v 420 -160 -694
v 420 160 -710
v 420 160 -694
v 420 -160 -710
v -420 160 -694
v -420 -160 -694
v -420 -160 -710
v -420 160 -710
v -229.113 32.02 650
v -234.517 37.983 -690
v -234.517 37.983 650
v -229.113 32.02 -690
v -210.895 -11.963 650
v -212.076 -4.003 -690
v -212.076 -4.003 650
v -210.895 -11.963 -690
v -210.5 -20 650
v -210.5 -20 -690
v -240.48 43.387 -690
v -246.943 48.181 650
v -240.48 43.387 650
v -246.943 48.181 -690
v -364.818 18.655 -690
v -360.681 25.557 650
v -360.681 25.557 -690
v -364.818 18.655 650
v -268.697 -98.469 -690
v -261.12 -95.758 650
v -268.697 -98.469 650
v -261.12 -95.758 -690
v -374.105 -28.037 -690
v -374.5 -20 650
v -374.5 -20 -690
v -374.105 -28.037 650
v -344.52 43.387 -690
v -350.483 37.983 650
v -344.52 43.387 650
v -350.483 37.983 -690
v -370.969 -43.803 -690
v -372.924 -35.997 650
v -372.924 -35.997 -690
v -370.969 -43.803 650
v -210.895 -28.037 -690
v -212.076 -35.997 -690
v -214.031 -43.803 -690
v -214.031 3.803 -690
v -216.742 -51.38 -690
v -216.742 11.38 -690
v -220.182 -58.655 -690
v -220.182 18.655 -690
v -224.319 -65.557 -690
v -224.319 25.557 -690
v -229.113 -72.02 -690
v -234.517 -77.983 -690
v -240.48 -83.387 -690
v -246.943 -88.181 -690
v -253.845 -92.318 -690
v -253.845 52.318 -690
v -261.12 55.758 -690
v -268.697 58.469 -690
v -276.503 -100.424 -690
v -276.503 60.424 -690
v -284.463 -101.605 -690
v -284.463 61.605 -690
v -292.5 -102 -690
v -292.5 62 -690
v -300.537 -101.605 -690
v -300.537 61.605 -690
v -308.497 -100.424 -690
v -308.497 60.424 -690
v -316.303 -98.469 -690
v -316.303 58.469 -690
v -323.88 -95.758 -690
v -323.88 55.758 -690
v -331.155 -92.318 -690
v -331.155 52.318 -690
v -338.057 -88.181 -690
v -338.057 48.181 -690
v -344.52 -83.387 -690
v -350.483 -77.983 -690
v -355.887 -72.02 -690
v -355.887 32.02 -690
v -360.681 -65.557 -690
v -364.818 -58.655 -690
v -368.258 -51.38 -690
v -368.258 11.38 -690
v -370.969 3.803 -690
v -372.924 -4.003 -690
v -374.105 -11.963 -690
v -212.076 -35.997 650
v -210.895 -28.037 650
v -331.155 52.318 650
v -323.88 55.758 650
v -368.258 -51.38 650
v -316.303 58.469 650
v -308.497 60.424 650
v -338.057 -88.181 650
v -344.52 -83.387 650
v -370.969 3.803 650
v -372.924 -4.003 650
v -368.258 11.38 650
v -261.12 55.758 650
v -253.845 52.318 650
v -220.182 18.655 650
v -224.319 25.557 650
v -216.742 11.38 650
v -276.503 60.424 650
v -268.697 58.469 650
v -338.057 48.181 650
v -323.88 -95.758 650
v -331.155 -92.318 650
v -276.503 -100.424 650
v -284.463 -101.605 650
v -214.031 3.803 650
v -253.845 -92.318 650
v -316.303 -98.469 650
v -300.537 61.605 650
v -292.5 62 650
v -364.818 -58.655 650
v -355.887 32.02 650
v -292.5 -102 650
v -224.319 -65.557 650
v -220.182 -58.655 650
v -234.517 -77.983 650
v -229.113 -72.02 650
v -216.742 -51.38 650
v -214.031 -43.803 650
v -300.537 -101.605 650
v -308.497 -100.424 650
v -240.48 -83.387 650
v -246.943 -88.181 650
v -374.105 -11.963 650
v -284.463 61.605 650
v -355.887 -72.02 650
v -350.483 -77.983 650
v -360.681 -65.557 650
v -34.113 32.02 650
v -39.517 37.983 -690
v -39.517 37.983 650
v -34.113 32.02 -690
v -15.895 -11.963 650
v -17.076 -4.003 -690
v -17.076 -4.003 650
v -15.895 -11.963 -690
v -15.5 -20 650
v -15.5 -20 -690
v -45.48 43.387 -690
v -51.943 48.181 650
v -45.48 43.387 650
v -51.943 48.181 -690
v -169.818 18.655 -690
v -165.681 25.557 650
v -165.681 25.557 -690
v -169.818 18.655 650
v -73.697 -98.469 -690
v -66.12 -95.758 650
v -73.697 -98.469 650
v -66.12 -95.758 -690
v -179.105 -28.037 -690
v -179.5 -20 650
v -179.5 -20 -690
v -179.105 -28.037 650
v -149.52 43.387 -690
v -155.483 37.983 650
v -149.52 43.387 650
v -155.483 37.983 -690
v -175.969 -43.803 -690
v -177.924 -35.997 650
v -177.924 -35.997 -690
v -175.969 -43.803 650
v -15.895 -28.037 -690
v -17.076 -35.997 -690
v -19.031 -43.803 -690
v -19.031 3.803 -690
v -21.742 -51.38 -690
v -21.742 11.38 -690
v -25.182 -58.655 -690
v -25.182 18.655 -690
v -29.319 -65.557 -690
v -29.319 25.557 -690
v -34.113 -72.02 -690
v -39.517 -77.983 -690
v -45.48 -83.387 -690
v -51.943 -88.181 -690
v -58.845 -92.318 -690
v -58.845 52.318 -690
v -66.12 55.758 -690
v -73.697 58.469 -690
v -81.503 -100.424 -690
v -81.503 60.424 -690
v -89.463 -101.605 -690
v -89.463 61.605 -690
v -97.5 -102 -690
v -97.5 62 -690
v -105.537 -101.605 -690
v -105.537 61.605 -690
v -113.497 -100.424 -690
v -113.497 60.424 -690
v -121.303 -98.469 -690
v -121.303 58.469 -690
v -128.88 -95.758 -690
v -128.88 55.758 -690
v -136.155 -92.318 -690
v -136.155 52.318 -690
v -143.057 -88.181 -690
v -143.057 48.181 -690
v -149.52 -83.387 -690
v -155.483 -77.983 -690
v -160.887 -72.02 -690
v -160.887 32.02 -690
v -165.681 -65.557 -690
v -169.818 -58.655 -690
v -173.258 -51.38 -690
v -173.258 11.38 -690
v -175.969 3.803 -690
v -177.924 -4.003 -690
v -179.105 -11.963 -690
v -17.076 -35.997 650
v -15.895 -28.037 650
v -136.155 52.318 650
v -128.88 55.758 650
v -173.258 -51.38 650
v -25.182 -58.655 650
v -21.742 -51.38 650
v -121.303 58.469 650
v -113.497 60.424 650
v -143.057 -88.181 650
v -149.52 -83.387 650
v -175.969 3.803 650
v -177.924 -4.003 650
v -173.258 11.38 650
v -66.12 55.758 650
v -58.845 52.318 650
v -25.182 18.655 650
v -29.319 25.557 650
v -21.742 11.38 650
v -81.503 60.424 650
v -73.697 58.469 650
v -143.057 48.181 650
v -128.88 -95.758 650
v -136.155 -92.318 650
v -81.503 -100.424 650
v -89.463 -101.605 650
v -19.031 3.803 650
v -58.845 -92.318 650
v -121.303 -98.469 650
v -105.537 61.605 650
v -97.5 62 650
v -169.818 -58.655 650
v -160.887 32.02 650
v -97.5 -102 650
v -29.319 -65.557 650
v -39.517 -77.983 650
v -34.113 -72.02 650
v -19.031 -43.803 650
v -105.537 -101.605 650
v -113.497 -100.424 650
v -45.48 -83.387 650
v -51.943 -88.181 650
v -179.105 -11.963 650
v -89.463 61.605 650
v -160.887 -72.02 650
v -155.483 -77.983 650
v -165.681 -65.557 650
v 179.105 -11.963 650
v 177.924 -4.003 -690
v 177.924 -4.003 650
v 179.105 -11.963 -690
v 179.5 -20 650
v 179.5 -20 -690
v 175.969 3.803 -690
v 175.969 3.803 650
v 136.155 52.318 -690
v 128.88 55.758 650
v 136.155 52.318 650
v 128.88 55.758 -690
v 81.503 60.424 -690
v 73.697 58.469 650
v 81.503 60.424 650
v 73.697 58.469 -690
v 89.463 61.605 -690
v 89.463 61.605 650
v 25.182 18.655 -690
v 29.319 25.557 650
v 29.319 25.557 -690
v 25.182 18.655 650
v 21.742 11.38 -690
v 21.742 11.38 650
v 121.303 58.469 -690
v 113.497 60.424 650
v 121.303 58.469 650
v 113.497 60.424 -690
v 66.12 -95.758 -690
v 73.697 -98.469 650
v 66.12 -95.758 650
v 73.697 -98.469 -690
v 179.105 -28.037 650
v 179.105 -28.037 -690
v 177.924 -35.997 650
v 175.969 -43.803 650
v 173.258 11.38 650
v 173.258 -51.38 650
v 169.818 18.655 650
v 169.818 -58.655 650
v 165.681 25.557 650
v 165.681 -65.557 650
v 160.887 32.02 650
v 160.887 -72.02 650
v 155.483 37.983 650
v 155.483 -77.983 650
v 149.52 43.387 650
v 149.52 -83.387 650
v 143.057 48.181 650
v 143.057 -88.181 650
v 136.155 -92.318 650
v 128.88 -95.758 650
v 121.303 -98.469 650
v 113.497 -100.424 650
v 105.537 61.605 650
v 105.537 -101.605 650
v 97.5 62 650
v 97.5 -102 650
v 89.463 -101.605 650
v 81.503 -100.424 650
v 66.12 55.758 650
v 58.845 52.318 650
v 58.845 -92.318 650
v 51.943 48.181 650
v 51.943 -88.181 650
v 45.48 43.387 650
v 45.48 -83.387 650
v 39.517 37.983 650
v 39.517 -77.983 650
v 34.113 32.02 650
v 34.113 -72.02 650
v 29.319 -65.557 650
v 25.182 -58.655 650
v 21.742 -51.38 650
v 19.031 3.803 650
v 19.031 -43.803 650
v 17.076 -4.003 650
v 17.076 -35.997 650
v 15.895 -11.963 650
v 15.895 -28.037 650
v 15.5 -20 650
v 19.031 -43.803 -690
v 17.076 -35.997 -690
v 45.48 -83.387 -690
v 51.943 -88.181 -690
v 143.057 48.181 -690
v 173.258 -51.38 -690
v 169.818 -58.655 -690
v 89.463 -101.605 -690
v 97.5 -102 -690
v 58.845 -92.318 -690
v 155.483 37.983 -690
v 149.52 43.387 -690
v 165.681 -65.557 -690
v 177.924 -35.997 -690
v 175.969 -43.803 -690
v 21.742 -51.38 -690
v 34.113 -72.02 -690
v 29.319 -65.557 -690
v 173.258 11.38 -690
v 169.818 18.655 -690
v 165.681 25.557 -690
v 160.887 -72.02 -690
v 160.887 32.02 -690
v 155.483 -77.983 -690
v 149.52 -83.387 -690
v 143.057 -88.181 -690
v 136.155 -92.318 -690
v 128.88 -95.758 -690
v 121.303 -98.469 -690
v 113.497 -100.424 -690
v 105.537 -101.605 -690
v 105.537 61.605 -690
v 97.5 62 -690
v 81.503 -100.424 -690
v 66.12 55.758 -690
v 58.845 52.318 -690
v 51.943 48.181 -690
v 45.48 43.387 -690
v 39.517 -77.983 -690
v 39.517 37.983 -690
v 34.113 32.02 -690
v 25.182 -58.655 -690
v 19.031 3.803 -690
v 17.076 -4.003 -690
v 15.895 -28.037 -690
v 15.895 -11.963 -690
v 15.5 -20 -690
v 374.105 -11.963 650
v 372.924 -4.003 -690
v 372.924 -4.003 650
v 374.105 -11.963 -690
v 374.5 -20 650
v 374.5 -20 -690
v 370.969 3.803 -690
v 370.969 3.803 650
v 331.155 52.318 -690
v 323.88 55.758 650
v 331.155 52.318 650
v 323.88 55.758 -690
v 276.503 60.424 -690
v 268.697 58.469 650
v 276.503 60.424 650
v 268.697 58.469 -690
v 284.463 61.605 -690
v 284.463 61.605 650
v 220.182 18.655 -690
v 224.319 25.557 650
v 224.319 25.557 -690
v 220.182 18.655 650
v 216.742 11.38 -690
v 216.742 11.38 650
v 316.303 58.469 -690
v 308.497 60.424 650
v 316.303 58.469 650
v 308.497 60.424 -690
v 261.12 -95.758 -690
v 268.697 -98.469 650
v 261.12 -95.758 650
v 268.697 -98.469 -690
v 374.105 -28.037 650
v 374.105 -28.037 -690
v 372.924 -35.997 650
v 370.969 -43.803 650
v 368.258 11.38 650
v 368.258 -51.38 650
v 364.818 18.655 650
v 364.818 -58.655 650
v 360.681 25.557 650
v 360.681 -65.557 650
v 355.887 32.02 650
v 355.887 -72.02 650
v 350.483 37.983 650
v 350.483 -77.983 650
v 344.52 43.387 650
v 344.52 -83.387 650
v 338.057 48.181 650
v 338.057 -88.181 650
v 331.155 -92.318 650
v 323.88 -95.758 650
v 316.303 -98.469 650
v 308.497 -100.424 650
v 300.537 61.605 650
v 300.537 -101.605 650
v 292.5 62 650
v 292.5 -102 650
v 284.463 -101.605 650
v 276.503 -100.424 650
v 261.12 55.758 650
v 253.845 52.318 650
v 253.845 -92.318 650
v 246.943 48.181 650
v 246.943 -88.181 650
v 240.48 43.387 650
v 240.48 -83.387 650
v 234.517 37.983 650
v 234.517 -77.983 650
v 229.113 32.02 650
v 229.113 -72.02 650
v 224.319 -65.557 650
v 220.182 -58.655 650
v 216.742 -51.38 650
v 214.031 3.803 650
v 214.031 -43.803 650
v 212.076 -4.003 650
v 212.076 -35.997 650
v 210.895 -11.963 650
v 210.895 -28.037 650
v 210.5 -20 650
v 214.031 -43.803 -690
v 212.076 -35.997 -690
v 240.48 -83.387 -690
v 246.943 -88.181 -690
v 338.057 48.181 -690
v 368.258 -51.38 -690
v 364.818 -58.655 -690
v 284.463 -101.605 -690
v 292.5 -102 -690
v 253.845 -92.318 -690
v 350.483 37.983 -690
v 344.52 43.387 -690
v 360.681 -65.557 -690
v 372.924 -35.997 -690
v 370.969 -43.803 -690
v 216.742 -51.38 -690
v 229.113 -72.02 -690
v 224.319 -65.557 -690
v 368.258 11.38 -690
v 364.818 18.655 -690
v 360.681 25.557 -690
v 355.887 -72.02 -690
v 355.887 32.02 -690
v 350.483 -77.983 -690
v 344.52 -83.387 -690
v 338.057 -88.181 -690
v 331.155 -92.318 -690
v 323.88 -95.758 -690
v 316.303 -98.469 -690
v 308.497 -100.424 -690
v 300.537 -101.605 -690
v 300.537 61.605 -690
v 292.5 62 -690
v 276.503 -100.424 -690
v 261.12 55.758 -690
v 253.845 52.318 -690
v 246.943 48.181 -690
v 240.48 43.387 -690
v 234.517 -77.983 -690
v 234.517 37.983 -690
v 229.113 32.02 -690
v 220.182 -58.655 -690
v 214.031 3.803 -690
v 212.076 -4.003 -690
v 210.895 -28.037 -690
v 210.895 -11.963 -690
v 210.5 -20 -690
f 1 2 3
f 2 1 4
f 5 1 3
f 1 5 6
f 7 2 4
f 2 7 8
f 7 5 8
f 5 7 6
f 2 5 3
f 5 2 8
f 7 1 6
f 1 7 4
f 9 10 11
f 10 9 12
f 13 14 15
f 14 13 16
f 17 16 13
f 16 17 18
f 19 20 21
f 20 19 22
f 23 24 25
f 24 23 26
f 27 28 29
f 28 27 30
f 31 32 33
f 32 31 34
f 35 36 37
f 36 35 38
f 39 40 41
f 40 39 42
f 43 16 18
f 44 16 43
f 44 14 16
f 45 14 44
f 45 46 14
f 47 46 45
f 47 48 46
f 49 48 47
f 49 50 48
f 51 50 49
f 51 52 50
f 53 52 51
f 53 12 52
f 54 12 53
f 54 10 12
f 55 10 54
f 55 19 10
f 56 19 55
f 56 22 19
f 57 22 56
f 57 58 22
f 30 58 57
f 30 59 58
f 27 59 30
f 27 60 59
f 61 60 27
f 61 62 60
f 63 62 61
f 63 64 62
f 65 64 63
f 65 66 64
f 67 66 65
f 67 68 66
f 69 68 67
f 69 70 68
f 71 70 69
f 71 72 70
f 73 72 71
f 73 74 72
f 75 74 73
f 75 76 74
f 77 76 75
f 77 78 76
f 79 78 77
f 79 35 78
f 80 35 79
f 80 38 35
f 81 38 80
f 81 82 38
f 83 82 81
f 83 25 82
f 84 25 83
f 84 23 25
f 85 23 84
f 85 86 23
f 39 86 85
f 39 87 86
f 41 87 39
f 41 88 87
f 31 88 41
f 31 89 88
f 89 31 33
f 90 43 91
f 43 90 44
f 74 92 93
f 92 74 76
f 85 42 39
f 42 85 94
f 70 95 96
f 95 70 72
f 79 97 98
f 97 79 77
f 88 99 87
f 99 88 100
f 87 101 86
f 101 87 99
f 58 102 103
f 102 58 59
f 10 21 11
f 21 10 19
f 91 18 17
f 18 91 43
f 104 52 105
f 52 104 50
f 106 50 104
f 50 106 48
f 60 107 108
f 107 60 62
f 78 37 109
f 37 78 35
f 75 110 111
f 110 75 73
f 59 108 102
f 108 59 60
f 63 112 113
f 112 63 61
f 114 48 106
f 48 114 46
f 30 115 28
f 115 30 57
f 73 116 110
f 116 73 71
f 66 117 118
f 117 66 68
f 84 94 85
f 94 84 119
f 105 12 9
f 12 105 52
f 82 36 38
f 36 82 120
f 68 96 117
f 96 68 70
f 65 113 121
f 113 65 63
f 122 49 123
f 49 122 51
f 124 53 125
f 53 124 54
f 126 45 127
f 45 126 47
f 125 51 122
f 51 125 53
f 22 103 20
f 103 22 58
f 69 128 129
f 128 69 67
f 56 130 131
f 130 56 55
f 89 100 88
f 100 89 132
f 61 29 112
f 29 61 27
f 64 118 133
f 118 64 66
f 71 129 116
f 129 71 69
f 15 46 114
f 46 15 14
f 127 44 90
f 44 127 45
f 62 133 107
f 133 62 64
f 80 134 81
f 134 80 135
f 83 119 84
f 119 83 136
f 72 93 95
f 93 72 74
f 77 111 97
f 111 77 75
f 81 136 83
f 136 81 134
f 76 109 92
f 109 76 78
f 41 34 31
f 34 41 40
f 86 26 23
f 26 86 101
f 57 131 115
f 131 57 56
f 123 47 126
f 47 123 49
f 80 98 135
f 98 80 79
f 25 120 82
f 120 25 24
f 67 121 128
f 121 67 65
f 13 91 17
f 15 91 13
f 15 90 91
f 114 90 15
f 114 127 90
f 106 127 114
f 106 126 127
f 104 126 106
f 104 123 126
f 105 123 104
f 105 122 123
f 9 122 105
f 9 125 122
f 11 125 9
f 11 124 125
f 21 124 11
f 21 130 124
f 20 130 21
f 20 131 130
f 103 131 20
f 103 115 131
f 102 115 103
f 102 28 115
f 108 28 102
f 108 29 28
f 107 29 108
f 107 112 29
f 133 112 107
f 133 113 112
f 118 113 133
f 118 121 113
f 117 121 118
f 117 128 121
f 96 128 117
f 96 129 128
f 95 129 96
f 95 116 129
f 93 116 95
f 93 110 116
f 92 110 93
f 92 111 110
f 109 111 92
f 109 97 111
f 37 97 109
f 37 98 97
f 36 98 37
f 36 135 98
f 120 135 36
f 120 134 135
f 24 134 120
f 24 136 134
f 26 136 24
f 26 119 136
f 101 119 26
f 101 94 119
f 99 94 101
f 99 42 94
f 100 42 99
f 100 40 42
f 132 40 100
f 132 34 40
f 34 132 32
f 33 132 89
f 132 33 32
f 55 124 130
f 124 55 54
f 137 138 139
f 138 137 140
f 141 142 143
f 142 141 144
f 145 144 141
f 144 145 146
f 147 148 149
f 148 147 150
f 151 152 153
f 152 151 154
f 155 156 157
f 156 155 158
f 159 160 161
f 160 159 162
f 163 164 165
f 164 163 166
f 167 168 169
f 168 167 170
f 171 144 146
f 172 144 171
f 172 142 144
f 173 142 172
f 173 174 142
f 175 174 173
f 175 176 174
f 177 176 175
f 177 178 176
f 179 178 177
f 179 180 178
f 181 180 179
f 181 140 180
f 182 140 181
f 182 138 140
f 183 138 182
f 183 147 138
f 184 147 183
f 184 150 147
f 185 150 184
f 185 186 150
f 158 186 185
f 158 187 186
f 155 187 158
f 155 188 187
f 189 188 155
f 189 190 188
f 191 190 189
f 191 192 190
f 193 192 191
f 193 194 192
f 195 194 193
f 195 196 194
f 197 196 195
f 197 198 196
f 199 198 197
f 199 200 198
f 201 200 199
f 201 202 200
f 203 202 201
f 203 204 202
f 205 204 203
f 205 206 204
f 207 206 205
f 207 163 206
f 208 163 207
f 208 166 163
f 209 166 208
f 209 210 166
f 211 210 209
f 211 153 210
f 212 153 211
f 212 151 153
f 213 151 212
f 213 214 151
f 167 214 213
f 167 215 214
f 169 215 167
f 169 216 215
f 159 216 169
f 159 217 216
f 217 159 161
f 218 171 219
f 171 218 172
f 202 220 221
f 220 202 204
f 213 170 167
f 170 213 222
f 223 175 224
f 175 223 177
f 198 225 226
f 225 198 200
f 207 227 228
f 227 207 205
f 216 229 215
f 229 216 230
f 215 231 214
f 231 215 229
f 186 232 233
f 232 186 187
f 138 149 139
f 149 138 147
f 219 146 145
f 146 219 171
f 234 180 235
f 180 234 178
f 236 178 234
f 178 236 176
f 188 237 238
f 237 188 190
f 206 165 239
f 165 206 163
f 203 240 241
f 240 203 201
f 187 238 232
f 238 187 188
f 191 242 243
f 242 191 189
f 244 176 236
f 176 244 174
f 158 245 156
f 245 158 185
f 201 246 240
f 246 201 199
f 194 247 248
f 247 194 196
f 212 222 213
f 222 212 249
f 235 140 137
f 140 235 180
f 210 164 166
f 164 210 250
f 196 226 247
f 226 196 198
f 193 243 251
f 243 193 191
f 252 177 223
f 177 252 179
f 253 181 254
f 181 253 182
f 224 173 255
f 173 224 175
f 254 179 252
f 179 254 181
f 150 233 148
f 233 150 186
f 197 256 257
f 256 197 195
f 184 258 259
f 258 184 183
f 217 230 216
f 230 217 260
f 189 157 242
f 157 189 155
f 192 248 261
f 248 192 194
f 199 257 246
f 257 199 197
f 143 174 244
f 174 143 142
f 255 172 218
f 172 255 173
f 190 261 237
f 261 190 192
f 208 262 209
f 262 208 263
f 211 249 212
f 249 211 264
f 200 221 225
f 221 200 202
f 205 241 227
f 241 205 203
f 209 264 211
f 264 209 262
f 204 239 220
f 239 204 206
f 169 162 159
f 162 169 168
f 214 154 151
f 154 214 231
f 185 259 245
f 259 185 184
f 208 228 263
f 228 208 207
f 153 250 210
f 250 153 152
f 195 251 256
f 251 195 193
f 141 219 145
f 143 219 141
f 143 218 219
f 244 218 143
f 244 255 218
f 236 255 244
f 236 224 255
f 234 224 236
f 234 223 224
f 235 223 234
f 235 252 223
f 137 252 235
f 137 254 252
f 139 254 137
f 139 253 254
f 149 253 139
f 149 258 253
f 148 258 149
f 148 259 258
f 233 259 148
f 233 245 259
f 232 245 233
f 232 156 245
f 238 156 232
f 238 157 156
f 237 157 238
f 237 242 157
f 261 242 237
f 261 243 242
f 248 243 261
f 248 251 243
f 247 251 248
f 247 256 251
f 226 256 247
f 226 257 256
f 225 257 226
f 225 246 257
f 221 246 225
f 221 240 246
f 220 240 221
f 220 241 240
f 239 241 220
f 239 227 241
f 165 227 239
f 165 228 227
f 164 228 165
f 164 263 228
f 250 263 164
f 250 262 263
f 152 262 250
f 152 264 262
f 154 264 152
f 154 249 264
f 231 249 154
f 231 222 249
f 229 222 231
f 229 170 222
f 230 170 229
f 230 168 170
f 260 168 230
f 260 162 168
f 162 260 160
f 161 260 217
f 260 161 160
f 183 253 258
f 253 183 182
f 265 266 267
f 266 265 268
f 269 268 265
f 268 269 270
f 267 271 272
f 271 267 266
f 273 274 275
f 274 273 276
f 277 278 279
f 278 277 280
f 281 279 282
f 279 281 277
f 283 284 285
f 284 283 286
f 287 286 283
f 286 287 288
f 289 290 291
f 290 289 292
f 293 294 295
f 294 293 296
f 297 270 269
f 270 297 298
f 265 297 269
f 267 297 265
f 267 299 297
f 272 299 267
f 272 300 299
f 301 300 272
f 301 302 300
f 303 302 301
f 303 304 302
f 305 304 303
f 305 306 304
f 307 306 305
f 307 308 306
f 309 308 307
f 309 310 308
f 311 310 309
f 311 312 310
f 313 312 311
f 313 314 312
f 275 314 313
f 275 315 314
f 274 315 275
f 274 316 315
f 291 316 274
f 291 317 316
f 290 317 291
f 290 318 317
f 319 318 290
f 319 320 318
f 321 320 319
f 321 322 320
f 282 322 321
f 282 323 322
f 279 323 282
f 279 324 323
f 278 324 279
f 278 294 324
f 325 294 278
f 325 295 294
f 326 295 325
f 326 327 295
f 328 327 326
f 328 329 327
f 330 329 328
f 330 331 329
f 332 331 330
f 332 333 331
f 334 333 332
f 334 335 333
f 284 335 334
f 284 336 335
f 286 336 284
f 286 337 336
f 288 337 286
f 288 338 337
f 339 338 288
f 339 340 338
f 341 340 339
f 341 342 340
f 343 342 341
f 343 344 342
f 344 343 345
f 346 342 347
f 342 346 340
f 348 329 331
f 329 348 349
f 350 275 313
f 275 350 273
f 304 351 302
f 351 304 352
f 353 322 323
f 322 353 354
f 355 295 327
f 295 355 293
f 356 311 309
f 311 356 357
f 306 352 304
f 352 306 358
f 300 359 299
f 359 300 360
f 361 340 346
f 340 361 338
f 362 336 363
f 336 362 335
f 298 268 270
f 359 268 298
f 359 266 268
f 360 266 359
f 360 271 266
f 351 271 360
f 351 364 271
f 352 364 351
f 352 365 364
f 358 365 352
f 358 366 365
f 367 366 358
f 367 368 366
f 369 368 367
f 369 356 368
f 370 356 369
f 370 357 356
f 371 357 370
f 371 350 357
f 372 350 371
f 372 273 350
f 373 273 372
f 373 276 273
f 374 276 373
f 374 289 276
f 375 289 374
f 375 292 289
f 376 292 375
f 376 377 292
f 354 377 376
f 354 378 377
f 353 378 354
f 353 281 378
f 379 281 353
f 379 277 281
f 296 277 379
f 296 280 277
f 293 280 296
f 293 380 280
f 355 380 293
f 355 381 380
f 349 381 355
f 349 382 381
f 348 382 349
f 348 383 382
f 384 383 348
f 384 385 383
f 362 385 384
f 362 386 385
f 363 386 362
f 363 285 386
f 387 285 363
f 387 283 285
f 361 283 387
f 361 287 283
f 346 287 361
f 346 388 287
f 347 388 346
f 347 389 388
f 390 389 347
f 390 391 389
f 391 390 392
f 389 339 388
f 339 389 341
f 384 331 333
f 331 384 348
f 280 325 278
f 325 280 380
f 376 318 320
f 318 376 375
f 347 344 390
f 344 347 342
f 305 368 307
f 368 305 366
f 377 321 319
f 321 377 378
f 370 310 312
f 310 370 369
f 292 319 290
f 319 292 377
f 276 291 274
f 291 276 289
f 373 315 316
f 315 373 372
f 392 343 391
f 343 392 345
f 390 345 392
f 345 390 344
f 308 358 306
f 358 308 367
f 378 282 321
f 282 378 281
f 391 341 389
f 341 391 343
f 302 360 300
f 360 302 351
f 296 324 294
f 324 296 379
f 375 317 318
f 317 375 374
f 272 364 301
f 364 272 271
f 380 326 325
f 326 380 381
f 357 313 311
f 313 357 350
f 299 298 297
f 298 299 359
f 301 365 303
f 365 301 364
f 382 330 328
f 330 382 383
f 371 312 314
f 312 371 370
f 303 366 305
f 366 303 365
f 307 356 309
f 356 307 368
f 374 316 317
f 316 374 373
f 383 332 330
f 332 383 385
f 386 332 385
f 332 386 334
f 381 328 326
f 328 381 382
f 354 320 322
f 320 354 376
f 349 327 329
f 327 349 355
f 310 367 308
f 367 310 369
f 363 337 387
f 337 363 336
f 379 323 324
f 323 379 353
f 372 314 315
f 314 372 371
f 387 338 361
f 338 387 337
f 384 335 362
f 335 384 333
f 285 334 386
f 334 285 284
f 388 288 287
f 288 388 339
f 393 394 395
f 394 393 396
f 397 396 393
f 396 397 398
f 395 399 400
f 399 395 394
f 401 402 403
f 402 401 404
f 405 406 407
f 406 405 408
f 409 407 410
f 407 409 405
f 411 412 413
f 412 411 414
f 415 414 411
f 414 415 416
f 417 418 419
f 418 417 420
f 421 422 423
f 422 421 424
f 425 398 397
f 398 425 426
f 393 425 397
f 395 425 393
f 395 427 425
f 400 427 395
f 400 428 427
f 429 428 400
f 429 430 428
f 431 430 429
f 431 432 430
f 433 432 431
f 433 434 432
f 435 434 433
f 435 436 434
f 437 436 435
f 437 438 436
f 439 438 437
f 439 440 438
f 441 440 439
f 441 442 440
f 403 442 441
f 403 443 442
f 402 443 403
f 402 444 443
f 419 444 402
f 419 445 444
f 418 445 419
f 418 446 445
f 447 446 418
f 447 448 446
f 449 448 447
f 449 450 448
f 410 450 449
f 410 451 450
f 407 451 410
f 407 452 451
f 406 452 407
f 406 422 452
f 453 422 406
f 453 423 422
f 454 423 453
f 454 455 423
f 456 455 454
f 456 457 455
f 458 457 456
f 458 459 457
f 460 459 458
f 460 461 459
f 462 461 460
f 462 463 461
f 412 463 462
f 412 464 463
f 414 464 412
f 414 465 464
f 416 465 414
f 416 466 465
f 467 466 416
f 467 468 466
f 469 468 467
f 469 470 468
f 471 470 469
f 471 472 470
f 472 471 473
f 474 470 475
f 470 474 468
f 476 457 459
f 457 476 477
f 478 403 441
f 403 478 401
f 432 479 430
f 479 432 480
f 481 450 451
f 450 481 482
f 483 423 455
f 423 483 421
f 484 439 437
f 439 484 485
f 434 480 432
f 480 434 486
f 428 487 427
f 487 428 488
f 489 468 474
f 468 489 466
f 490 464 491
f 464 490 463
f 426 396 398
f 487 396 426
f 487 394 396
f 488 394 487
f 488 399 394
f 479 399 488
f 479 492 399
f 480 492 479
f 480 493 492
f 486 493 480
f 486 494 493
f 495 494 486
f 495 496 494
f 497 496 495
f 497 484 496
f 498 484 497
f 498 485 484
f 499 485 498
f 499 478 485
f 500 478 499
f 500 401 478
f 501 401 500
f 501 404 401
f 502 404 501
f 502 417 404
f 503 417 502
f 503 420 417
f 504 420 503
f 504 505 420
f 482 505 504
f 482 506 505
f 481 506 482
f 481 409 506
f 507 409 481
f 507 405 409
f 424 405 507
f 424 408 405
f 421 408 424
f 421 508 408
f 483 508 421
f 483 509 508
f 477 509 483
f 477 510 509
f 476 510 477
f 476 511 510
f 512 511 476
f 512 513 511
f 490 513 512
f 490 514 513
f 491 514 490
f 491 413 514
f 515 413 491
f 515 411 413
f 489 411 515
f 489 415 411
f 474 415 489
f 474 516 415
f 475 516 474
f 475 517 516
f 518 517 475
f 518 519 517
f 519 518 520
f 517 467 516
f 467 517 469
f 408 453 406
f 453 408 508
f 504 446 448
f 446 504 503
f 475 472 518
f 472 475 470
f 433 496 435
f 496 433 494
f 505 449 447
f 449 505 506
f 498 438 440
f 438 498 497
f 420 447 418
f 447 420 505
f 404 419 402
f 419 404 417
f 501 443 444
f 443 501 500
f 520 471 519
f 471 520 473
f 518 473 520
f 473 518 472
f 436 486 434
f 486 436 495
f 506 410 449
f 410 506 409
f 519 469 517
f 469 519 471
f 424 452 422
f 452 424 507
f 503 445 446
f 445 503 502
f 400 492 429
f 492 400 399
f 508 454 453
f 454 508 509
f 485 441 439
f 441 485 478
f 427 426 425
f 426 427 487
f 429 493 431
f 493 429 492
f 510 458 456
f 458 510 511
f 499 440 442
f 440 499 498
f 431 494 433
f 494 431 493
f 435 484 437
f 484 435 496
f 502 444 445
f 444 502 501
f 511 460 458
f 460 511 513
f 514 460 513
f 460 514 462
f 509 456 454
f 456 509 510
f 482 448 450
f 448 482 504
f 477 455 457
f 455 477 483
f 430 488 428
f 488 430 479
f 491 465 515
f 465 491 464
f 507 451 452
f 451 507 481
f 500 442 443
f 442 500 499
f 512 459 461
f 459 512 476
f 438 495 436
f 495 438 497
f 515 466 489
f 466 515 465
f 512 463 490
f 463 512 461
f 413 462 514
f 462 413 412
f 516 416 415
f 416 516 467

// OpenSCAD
// ============================================================================
// Atom Lithography Machine — Parametric OpenSCAD Module (S9.2-01)
// ============================================================================
// part_id           : S9.2-01
// parent_bom_id     : S9.2
// subsystem         : S9
// part_name         : Yuksek saflikta PH3 (%5 H2/Ar) ve 29SiF4/28SiF4 kaynak gaz tupleri (1 yil)
// material          : 316L
// temp_stage        : 300 K (gaz kabini)
// vacuum_grade      : Basincli tup
// tolerance         : >99.999%
// computed_mass_kg  : 168.00000
// envelope_mm       : 840.000 x 320.000 x 1381.500
// design_maturity   : M0_M1_DETAILED_CAD_DESIGN_ONLY
// no_lab_measurement: true
// iec61508_certified: false
// semi_s2_certified : false
// Units: millimeters (mm)
// ============================================================================

$fn = 64;

// Nominal bounding envelope parameters (mm)
bbox_x = 840.0000;
bbox_y = 320.0000;
bbox_z = 1381.5000;

// Part-specific parametric dimensions
qty_cylinders = 4;
cyl_od_mm = 164.0;
rack_w_mm = 840.0;

// Interface / port parameters (mm)

module part_S9_2_01() {
  union() {
    // Seismic floor baseplate
    translate([0.000, 0.000, -702.000]) cube([840.000, 320.000, 16.000], center=true);
    // Cylinder #1 (PH3)
    translate([-292.500, -20.000, -20.000]) cylinder(d=164.000, h=1340.000, center=true);
    // Cylinder #2 (29SiF4)
    translate([-97.500, -20.000, -20.000]) cylinder(d=164.000, h=1340.000, center=true);
    // Cylinder #3 (28SiF4)
    translate([97.500, -20.000, -20.000]) cylinder(d=164.000, h=1340.000, center=true);
    // Cylinder #4 (Ar/N2)
    translate([292.500, -20.000, -20.000]) cylinder(d=164.000, h=1340.000, center=true);
  }
}

// World assembly mounting transform (global machine frame, mm / deg):
// translate([-1350.000, -1520.000, 710.000]) rotate([0.000, 0.000, 0.000]) part_S9_2_01();

part_S9_2_01();
